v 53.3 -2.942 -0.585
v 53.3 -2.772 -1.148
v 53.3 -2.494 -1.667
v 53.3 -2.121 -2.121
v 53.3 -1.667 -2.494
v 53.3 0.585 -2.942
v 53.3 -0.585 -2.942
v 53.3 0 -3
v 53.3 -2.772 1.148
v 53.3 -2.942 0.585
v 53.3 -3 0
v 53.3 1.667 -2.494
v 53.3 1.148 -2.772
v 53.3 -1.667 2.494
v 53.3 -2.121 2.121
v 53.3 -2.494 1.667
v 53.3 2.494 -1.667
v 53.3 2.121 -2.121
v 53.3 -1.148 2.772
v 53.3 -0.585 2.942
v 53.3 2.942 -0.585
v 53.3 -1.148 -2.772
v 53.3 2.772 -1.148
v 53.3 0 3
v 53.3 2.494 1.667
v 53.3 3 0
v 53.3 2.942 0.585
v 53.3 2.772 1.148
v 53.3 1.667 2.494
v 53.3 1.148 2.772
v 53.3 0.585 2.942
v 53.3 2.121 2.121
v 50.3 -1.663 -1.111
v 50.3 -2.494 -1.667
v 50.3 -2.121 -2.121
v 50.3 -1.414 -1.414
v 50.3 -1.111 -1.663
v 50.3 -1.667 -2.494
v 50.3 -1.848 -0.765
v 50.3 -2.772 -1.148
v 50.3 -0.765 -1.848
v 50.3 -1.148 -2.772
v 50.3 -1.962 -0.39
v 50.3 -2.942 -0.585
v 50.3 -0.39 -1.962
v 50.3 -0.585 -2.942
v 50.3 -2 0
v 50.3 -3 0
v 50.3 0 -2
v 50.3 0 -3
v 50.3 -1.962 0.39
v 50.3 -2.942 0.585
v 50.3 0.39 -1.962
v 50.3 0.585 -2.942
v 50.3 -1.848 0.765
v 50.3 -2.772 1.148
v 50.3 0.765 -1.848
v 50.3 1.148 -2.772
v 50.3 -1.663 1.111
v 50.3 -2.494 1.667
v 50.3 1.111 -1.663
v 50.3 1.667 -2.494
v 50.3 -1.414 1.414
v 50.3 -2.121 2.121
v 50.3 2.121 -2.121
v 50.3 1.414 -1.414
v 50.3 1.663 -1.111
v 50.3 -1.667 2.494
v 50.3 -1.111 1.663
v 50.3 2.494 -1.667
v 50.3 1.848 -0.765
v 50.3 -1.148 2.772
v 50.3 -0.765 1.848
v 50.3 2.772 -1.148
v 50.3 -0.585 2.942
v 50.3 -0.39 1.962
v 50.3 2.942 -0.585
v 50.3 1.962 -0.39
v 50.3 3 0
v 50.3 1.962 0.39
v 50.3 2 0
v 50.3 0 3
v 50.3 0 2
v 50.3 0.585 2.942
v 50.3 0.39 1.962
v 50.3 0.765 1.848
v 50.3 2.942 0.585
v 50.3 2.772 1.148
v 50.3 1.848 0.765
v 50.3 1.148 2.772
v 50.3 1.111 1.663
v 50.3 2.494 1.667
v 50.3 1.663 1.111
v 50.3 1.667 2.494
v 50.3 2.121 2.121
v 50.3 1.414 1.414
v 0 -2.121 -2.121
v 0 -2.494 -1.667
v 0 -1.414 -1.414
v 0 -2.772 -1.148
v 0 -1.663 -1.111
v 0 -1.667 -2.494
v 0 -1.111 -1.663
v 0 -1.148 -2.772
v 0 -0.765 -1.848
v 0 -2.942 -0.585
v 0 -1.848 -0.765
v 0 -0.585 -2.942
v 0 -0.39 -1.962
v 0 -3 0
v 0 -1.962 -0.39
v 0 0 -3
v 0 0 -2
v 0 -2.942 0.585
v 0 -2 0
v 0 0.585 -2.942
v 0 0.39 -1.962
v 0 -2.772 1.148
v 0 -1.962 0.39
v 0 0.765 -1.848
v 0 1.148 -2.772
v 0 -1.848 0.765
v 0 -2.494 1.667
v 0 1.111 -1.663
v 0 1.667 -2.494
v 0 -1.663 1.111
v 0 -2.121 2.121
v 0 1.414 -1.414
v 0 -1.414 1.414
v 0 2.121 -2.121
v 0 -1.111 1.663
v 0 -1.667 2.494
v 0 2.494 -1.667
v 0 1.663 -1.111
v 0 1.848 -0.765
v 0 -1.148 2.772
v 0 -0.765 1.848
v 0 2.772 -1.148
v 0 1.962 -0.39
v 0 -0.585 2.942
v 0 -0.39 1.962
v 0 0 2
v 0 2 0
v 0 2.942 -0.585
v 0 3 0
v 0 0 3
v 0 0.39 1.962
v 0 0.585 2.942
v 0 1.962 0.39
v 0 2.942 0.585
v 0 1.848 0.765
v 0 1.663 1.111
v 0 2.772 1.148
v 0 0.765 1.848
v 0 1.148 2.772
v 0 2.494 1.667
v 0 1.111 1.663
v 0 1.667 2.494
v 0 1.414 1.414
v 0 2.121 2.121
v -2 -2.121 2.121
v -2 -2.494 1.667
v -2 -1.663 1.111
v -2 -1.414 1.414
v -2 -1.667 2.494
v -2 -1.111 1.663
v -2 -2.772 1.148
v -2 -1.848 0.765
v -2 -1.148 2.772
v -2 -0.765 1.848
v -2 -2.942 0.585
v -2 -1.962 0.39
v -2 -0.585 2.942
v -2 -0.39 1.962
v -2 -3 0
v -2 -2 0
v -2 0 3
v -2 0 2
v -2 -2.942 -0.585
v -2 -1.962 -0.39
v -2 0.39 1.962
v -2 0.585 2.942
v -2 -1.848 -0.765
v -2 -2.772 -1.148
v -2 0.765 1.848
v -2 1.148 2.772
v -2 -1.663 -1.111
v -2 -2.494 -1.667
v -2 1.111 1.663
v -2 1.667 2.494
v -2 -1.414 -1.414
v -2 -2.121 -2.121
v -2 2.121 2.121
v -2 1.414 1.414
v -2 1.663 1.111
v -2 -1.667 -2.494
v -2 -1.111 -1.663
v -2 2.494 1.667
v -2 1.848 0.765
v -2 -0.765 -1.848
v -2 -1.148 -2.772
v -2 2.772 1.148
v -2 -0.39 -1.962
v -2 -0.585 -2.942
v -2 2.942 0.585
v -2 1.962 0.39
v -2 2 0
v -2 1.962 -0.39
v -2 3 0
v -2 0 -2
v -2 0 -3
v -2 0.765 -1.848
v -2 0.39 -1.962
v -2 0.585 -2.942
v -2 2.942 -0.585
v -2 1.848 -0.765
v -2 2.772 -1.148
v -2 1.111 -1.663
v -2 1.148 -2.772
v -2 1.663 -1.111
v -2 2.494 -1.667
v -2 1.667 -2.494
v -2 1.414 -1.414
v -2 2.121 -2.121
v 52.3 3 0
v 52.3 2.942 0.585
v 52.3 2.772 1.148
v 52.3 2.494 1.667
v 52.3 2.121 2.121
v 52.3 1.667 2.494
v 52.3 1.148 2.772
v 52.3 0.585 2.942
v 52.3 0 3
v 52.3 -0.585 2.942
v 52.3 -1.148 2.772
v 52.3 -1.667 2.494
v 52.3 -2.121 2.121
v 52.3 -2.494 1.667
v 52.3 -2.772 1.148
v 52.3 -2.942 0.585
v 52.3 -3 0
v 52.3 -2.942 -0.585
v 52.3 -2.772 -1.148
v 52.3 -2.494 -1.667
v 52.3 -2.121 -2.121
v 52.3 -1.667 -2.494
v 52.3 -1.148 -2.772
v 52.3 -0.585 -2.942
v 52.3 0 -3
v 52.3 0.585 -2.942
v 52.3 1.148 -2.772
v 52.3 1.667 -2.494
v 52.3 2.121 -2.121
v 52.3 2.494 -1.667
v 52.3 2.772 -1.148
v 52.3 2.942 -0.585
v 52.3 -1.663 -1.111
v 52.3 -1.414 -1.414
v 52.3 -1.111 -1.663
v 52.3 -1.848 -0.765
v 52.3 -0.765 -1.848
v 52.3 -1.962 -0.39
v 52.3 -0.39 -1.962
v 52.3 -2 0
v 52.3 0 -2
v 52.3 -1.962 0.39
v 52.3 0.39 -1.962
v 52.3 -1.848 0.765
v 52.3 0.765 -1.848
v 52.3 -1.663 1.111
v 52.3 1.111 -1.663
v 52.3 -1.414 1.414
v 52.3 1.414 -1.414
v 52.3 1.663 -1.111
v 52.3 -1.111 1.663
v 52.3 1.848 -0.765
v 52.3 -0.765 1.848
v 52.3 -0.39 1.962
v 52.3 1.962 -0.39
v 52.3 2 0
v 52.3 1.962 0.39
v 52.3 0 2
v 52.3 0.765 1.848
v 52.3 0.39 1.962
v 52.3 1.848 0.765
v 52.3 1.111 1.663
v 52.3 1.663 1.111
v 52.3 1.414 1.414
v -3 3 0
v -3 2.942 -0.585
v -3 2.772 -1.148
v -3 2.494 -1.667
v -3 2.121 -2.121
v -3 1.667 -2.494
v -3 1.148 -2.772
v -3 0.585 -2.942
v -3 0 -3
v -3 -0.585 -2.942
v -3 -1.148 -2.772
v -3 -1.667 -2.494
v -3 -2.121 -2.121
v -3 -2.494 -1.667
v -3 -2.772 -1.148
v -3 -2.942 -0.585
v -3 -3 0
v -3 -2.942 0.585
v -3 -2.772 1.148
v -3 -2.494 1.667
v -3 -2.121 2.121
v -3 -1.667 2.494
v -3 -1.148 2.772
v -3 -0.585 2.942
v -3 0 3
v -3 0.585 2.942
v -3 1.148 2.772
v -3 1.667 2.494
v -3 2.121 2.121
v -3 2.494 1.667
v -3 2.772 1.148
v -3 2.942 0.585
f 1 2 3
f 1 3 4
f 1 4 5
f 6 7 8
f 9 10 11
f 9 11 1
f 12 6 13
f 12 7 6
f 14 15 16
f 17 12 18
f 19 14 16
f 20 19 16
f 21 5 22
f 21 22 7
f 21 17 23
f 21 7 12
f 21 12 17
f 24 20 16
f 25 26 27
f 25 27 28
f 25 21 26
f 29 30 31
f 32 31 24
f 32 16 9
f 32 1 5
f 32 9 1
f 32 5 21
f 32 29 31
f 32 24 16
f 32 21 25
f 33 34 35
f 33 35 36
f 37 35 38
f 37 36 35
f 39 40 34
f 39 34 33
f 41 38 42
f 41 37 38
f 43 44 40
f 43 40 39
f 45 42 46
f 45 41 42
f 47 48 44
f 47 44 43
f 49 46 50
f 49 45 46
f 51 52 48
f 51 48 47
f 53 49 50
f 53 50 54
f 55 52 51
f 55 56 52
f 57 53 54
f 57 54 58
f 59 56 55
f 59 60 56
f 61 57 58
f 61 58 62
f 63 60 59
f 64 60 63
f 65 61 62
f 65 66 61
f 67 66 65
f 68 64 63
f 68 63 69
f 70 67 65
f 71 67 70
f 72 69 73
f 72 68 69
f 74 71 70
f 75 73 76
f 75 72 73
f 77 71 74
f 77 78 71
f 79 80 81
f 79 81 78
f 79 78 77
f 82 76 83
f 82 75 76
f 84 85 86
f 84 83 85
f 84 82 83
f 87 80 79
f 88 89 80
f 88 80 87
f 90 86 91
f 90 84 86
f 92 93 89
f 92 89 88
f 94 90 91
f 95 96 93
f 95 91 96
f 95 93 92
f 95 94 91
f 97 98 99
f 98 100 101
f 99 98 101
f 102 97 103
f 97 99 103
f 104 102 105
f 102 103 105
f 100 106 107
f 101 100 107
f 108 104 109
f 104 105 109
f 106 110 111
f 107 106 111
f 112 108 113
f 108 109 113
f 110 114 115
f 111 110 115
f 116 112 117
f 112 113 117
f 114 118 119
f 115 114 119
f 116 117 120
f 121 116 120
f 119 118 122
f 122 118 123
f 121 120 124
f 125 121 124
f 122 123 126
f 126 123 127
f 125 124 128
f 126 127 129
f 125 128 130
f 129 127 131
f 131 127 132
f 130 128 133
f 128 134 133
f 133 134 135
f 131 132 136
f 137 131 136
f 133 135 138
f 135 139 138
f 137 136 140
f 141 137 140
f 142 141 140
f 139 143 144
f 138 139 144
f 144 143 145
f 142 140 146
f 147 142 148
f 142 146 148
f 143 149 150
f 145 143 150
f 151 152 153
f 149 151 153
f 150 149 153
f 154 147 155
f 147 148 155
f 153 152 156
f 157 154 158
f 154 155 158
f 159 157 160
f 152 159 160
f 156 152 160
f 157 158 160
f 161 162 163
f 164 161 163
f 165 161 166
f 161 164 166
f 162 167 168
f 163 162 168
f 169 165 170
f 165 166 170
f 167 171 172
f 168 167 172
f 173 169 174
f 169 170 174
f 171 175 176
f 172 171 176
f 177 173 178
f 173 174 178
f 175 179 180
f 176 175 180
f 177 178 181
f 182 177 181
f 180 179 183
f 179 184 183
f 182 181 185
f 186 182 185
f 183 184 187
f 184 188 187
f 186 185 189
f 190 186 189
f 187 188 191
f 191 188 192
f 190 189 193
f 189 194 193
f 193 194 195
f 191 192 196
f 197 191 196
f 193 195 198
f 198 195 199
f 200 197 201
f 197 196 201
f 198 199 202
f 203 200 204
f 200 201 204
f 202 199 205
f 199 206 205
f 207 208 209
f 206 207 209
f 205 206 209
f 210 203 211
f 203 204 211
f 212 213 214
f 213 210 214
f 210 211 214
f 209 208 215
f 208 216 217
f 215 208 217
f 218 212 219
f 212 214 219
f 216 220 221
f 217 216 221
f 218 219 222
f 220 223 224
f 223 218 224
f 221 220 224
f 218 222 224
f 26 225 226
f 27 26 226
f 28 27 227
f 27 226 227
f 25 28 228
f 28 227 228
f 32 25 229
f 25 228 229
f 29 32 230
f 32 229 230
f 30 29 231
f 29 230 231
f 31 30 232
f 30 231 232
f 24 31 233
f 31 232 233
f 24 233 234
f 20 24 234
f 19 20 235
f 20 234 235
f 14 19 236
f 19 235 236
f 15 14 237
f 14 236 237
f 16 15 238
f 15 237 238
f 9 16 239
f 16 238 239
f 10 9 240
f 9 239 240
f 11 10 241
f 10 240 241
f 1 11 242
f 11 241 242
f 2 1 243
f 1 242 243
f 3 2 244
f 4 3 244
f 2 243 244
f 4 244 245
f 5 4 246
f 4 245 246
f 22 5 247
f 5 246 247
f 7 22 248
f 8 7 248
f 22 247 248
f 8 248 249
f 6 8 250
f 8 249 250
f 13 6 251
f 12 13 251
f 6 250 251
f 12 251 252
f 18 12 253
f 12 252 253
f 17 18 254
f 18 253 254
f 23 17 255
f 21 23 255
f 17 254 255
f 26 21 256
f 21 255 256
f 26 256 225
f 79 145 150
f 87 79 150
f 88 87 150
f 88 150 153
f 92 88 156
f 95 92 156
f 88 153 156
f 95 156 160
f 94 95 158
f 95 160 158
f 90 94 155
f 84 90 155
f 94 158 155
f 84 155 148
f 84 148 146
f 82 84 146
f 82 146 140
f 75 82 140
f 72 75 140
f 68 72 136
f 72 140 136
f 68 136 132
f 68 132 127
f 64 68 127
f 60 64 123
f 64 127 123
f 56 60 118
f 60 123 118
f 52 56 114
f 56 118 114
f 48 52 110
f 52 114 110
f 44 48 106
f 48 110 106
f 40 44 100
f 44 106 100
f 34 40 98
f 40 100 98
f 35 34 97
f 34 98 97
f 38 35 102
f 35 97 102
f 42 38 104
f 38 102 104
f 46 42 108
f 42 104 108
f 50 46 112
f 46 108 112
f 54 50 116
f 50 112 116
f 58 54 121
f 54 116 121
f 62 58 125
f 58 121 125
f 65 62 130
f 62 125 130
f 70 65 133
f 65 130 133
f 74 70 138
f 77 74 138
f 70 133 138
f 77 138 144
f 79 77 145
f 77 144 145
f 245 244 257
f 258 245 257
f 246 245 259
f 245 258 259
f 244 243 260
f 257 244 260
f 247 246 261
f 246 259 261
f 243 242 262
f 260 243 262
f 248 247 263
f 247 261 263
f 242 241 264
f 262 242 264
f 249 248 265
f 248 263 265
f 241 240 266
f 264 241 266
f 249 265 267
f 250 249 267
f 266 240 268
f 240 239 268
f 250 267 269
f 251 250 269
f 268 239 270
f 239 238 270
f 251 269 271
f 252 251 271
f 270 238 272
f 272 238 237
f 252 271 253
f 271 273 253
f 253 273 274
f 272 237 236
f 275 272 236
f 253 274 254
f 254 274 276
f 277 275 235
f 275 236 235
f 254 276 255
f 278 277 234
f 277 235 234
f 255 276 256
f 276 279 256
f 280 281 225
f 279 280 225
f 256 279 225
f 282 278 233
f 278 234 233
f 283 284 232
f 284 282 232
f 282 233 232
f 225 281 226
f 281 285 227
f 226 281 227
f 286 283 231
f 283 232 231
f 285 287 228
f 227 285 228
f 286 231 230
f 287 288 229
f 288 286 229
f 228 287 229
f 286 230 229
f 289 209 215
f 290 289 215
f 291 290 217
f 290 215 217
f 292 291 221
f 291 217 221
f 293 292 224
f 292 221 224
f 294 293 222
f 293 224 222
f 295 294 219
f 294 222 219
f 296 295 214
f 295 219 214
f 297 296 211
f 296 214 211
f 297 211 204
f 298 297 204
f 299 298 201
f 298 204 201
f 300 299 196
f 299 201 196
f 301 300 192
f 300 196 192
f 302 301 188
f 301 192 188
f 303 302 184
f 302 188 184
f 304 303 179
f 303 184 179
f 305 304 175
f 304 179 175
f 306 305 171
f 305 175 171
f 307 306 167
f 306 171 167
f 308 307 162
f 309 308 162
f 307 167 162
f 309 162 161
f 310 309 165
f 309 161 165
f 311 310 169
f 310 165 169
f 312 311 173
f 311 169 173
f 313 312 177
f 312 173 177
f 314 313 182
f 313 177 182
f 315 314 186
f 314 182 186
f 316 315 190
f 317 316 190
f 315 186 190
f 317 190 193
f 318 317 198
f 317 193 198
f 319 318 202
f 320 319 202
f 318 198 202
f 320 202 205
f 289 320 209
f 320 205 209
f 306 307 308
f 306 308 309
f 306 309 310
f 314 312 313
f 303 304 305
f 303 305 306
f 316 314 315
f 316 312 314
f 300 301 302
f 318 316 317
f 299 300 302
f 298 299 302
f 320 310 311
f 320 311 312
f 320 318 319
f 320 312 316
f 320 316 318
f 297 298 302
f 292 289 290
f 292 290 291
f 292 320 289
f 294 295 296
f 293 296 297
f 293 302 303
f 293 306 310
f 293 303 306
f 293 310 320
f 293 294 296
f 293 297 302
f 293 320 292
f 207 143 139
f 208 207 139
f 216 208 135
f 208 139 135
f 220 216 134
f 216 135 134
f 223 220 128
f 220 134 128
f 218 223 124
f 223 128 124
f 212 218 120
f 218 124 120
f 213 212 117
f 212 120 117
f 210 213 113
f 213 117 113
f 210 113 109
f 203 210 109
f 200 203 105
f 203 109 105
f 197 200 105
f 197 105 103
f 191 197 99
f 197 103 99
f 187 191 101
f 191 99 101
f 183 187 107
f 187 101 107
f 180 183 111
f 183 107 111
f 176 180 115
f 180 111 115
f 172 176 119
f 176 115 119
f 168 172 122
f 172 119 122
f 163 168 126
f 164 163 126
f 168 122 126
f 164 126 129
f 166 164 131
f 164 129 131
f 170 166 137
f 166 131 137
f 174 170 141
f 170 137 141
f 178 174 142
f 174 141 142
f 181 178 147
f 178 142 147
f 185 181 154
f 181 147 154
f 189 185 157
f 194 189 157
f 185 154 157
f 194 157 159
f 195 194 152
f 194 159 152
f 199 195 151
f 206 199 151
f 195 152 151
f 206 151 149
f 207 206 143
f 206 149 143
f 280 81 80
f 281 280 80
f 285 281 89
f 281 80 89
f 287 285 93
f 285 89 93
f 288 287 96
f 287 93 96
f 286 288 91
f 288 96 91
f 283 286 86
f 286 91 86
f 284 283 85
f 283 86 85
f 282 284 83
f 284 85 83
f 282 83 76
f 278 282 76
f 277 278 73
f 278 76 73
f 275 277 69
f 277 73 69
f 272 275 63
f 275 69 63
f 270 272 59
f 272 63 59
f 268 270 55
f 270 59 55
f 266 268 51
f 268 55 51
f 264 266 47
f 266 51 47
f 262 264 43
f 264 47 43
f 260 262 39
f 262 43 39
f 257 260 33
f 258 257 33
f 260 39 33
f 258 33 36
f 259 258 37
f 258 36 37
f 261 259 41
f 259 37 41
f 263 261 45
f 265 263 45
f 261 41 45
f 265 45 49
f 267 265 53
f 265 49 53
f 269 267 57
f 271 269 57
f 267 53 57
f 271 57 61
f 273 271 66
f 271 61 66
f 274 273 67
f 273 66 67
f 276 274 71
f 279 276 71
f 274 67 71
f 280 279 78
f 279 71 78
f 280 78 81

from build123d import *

# Parameters (mm, degrees)
SKETCH_R     = 3
PAD_DEPTH    = 50.3
SKETCH001_R  = 2
PAD001_DEPTH = 2
SKETCH002_R  = 3
PAD002_DEPTH = 1
SKETCH003_R  = 2
PAD003_DEPTH = 2
SKETCH004_R  = 3
PAD004_DEPTH = 1


with BuildPart() as part:
    # Sketch → Pad (new body)
    with BuildSketch(Plane.YZ):
        Circle(SKETCH_R)
    extrude(amount=PAD_DEPTH)

    # Sketch001 (on Face3 of Pad) → Pad001 (join)
    with BuildSketch(Plane.YZ.offset(50.3)):
        Circle(SKETCH001_R)
    extrude(amount=PAD001_DEPTH)

    # Sketch002 (on Face5 of Pad001) → Pad002 (join)
    with BuildSketch(Plane.YZ.offset(52.3)):
        Circle(SKETCH002_R)
    extrude(amount=PAD002_DEPTH)

    # Sketch003 (on Face7 of Pad002) → Pad003 (join)
    with BuildSketch(Plane(origin=(0, 0, 0), x_dir=(0, 1, 0), z_dir=(-1, 0, 0))):
        Circle(SKETCH003_R)
    extrude(amount=PAD003_DEPTH)

    # Sketch004 (on Face9 of Pad003) → Pad004 (join)
    with BuildSketch(Plane(origin=(-2, 0, 0), x_dir=(0, 1, 0), z_dir=(-1, 0, 0))):
        Circle(SKETCH004_R)
    extrude(amount=PAD004_DEPTH)


solid = part.part
